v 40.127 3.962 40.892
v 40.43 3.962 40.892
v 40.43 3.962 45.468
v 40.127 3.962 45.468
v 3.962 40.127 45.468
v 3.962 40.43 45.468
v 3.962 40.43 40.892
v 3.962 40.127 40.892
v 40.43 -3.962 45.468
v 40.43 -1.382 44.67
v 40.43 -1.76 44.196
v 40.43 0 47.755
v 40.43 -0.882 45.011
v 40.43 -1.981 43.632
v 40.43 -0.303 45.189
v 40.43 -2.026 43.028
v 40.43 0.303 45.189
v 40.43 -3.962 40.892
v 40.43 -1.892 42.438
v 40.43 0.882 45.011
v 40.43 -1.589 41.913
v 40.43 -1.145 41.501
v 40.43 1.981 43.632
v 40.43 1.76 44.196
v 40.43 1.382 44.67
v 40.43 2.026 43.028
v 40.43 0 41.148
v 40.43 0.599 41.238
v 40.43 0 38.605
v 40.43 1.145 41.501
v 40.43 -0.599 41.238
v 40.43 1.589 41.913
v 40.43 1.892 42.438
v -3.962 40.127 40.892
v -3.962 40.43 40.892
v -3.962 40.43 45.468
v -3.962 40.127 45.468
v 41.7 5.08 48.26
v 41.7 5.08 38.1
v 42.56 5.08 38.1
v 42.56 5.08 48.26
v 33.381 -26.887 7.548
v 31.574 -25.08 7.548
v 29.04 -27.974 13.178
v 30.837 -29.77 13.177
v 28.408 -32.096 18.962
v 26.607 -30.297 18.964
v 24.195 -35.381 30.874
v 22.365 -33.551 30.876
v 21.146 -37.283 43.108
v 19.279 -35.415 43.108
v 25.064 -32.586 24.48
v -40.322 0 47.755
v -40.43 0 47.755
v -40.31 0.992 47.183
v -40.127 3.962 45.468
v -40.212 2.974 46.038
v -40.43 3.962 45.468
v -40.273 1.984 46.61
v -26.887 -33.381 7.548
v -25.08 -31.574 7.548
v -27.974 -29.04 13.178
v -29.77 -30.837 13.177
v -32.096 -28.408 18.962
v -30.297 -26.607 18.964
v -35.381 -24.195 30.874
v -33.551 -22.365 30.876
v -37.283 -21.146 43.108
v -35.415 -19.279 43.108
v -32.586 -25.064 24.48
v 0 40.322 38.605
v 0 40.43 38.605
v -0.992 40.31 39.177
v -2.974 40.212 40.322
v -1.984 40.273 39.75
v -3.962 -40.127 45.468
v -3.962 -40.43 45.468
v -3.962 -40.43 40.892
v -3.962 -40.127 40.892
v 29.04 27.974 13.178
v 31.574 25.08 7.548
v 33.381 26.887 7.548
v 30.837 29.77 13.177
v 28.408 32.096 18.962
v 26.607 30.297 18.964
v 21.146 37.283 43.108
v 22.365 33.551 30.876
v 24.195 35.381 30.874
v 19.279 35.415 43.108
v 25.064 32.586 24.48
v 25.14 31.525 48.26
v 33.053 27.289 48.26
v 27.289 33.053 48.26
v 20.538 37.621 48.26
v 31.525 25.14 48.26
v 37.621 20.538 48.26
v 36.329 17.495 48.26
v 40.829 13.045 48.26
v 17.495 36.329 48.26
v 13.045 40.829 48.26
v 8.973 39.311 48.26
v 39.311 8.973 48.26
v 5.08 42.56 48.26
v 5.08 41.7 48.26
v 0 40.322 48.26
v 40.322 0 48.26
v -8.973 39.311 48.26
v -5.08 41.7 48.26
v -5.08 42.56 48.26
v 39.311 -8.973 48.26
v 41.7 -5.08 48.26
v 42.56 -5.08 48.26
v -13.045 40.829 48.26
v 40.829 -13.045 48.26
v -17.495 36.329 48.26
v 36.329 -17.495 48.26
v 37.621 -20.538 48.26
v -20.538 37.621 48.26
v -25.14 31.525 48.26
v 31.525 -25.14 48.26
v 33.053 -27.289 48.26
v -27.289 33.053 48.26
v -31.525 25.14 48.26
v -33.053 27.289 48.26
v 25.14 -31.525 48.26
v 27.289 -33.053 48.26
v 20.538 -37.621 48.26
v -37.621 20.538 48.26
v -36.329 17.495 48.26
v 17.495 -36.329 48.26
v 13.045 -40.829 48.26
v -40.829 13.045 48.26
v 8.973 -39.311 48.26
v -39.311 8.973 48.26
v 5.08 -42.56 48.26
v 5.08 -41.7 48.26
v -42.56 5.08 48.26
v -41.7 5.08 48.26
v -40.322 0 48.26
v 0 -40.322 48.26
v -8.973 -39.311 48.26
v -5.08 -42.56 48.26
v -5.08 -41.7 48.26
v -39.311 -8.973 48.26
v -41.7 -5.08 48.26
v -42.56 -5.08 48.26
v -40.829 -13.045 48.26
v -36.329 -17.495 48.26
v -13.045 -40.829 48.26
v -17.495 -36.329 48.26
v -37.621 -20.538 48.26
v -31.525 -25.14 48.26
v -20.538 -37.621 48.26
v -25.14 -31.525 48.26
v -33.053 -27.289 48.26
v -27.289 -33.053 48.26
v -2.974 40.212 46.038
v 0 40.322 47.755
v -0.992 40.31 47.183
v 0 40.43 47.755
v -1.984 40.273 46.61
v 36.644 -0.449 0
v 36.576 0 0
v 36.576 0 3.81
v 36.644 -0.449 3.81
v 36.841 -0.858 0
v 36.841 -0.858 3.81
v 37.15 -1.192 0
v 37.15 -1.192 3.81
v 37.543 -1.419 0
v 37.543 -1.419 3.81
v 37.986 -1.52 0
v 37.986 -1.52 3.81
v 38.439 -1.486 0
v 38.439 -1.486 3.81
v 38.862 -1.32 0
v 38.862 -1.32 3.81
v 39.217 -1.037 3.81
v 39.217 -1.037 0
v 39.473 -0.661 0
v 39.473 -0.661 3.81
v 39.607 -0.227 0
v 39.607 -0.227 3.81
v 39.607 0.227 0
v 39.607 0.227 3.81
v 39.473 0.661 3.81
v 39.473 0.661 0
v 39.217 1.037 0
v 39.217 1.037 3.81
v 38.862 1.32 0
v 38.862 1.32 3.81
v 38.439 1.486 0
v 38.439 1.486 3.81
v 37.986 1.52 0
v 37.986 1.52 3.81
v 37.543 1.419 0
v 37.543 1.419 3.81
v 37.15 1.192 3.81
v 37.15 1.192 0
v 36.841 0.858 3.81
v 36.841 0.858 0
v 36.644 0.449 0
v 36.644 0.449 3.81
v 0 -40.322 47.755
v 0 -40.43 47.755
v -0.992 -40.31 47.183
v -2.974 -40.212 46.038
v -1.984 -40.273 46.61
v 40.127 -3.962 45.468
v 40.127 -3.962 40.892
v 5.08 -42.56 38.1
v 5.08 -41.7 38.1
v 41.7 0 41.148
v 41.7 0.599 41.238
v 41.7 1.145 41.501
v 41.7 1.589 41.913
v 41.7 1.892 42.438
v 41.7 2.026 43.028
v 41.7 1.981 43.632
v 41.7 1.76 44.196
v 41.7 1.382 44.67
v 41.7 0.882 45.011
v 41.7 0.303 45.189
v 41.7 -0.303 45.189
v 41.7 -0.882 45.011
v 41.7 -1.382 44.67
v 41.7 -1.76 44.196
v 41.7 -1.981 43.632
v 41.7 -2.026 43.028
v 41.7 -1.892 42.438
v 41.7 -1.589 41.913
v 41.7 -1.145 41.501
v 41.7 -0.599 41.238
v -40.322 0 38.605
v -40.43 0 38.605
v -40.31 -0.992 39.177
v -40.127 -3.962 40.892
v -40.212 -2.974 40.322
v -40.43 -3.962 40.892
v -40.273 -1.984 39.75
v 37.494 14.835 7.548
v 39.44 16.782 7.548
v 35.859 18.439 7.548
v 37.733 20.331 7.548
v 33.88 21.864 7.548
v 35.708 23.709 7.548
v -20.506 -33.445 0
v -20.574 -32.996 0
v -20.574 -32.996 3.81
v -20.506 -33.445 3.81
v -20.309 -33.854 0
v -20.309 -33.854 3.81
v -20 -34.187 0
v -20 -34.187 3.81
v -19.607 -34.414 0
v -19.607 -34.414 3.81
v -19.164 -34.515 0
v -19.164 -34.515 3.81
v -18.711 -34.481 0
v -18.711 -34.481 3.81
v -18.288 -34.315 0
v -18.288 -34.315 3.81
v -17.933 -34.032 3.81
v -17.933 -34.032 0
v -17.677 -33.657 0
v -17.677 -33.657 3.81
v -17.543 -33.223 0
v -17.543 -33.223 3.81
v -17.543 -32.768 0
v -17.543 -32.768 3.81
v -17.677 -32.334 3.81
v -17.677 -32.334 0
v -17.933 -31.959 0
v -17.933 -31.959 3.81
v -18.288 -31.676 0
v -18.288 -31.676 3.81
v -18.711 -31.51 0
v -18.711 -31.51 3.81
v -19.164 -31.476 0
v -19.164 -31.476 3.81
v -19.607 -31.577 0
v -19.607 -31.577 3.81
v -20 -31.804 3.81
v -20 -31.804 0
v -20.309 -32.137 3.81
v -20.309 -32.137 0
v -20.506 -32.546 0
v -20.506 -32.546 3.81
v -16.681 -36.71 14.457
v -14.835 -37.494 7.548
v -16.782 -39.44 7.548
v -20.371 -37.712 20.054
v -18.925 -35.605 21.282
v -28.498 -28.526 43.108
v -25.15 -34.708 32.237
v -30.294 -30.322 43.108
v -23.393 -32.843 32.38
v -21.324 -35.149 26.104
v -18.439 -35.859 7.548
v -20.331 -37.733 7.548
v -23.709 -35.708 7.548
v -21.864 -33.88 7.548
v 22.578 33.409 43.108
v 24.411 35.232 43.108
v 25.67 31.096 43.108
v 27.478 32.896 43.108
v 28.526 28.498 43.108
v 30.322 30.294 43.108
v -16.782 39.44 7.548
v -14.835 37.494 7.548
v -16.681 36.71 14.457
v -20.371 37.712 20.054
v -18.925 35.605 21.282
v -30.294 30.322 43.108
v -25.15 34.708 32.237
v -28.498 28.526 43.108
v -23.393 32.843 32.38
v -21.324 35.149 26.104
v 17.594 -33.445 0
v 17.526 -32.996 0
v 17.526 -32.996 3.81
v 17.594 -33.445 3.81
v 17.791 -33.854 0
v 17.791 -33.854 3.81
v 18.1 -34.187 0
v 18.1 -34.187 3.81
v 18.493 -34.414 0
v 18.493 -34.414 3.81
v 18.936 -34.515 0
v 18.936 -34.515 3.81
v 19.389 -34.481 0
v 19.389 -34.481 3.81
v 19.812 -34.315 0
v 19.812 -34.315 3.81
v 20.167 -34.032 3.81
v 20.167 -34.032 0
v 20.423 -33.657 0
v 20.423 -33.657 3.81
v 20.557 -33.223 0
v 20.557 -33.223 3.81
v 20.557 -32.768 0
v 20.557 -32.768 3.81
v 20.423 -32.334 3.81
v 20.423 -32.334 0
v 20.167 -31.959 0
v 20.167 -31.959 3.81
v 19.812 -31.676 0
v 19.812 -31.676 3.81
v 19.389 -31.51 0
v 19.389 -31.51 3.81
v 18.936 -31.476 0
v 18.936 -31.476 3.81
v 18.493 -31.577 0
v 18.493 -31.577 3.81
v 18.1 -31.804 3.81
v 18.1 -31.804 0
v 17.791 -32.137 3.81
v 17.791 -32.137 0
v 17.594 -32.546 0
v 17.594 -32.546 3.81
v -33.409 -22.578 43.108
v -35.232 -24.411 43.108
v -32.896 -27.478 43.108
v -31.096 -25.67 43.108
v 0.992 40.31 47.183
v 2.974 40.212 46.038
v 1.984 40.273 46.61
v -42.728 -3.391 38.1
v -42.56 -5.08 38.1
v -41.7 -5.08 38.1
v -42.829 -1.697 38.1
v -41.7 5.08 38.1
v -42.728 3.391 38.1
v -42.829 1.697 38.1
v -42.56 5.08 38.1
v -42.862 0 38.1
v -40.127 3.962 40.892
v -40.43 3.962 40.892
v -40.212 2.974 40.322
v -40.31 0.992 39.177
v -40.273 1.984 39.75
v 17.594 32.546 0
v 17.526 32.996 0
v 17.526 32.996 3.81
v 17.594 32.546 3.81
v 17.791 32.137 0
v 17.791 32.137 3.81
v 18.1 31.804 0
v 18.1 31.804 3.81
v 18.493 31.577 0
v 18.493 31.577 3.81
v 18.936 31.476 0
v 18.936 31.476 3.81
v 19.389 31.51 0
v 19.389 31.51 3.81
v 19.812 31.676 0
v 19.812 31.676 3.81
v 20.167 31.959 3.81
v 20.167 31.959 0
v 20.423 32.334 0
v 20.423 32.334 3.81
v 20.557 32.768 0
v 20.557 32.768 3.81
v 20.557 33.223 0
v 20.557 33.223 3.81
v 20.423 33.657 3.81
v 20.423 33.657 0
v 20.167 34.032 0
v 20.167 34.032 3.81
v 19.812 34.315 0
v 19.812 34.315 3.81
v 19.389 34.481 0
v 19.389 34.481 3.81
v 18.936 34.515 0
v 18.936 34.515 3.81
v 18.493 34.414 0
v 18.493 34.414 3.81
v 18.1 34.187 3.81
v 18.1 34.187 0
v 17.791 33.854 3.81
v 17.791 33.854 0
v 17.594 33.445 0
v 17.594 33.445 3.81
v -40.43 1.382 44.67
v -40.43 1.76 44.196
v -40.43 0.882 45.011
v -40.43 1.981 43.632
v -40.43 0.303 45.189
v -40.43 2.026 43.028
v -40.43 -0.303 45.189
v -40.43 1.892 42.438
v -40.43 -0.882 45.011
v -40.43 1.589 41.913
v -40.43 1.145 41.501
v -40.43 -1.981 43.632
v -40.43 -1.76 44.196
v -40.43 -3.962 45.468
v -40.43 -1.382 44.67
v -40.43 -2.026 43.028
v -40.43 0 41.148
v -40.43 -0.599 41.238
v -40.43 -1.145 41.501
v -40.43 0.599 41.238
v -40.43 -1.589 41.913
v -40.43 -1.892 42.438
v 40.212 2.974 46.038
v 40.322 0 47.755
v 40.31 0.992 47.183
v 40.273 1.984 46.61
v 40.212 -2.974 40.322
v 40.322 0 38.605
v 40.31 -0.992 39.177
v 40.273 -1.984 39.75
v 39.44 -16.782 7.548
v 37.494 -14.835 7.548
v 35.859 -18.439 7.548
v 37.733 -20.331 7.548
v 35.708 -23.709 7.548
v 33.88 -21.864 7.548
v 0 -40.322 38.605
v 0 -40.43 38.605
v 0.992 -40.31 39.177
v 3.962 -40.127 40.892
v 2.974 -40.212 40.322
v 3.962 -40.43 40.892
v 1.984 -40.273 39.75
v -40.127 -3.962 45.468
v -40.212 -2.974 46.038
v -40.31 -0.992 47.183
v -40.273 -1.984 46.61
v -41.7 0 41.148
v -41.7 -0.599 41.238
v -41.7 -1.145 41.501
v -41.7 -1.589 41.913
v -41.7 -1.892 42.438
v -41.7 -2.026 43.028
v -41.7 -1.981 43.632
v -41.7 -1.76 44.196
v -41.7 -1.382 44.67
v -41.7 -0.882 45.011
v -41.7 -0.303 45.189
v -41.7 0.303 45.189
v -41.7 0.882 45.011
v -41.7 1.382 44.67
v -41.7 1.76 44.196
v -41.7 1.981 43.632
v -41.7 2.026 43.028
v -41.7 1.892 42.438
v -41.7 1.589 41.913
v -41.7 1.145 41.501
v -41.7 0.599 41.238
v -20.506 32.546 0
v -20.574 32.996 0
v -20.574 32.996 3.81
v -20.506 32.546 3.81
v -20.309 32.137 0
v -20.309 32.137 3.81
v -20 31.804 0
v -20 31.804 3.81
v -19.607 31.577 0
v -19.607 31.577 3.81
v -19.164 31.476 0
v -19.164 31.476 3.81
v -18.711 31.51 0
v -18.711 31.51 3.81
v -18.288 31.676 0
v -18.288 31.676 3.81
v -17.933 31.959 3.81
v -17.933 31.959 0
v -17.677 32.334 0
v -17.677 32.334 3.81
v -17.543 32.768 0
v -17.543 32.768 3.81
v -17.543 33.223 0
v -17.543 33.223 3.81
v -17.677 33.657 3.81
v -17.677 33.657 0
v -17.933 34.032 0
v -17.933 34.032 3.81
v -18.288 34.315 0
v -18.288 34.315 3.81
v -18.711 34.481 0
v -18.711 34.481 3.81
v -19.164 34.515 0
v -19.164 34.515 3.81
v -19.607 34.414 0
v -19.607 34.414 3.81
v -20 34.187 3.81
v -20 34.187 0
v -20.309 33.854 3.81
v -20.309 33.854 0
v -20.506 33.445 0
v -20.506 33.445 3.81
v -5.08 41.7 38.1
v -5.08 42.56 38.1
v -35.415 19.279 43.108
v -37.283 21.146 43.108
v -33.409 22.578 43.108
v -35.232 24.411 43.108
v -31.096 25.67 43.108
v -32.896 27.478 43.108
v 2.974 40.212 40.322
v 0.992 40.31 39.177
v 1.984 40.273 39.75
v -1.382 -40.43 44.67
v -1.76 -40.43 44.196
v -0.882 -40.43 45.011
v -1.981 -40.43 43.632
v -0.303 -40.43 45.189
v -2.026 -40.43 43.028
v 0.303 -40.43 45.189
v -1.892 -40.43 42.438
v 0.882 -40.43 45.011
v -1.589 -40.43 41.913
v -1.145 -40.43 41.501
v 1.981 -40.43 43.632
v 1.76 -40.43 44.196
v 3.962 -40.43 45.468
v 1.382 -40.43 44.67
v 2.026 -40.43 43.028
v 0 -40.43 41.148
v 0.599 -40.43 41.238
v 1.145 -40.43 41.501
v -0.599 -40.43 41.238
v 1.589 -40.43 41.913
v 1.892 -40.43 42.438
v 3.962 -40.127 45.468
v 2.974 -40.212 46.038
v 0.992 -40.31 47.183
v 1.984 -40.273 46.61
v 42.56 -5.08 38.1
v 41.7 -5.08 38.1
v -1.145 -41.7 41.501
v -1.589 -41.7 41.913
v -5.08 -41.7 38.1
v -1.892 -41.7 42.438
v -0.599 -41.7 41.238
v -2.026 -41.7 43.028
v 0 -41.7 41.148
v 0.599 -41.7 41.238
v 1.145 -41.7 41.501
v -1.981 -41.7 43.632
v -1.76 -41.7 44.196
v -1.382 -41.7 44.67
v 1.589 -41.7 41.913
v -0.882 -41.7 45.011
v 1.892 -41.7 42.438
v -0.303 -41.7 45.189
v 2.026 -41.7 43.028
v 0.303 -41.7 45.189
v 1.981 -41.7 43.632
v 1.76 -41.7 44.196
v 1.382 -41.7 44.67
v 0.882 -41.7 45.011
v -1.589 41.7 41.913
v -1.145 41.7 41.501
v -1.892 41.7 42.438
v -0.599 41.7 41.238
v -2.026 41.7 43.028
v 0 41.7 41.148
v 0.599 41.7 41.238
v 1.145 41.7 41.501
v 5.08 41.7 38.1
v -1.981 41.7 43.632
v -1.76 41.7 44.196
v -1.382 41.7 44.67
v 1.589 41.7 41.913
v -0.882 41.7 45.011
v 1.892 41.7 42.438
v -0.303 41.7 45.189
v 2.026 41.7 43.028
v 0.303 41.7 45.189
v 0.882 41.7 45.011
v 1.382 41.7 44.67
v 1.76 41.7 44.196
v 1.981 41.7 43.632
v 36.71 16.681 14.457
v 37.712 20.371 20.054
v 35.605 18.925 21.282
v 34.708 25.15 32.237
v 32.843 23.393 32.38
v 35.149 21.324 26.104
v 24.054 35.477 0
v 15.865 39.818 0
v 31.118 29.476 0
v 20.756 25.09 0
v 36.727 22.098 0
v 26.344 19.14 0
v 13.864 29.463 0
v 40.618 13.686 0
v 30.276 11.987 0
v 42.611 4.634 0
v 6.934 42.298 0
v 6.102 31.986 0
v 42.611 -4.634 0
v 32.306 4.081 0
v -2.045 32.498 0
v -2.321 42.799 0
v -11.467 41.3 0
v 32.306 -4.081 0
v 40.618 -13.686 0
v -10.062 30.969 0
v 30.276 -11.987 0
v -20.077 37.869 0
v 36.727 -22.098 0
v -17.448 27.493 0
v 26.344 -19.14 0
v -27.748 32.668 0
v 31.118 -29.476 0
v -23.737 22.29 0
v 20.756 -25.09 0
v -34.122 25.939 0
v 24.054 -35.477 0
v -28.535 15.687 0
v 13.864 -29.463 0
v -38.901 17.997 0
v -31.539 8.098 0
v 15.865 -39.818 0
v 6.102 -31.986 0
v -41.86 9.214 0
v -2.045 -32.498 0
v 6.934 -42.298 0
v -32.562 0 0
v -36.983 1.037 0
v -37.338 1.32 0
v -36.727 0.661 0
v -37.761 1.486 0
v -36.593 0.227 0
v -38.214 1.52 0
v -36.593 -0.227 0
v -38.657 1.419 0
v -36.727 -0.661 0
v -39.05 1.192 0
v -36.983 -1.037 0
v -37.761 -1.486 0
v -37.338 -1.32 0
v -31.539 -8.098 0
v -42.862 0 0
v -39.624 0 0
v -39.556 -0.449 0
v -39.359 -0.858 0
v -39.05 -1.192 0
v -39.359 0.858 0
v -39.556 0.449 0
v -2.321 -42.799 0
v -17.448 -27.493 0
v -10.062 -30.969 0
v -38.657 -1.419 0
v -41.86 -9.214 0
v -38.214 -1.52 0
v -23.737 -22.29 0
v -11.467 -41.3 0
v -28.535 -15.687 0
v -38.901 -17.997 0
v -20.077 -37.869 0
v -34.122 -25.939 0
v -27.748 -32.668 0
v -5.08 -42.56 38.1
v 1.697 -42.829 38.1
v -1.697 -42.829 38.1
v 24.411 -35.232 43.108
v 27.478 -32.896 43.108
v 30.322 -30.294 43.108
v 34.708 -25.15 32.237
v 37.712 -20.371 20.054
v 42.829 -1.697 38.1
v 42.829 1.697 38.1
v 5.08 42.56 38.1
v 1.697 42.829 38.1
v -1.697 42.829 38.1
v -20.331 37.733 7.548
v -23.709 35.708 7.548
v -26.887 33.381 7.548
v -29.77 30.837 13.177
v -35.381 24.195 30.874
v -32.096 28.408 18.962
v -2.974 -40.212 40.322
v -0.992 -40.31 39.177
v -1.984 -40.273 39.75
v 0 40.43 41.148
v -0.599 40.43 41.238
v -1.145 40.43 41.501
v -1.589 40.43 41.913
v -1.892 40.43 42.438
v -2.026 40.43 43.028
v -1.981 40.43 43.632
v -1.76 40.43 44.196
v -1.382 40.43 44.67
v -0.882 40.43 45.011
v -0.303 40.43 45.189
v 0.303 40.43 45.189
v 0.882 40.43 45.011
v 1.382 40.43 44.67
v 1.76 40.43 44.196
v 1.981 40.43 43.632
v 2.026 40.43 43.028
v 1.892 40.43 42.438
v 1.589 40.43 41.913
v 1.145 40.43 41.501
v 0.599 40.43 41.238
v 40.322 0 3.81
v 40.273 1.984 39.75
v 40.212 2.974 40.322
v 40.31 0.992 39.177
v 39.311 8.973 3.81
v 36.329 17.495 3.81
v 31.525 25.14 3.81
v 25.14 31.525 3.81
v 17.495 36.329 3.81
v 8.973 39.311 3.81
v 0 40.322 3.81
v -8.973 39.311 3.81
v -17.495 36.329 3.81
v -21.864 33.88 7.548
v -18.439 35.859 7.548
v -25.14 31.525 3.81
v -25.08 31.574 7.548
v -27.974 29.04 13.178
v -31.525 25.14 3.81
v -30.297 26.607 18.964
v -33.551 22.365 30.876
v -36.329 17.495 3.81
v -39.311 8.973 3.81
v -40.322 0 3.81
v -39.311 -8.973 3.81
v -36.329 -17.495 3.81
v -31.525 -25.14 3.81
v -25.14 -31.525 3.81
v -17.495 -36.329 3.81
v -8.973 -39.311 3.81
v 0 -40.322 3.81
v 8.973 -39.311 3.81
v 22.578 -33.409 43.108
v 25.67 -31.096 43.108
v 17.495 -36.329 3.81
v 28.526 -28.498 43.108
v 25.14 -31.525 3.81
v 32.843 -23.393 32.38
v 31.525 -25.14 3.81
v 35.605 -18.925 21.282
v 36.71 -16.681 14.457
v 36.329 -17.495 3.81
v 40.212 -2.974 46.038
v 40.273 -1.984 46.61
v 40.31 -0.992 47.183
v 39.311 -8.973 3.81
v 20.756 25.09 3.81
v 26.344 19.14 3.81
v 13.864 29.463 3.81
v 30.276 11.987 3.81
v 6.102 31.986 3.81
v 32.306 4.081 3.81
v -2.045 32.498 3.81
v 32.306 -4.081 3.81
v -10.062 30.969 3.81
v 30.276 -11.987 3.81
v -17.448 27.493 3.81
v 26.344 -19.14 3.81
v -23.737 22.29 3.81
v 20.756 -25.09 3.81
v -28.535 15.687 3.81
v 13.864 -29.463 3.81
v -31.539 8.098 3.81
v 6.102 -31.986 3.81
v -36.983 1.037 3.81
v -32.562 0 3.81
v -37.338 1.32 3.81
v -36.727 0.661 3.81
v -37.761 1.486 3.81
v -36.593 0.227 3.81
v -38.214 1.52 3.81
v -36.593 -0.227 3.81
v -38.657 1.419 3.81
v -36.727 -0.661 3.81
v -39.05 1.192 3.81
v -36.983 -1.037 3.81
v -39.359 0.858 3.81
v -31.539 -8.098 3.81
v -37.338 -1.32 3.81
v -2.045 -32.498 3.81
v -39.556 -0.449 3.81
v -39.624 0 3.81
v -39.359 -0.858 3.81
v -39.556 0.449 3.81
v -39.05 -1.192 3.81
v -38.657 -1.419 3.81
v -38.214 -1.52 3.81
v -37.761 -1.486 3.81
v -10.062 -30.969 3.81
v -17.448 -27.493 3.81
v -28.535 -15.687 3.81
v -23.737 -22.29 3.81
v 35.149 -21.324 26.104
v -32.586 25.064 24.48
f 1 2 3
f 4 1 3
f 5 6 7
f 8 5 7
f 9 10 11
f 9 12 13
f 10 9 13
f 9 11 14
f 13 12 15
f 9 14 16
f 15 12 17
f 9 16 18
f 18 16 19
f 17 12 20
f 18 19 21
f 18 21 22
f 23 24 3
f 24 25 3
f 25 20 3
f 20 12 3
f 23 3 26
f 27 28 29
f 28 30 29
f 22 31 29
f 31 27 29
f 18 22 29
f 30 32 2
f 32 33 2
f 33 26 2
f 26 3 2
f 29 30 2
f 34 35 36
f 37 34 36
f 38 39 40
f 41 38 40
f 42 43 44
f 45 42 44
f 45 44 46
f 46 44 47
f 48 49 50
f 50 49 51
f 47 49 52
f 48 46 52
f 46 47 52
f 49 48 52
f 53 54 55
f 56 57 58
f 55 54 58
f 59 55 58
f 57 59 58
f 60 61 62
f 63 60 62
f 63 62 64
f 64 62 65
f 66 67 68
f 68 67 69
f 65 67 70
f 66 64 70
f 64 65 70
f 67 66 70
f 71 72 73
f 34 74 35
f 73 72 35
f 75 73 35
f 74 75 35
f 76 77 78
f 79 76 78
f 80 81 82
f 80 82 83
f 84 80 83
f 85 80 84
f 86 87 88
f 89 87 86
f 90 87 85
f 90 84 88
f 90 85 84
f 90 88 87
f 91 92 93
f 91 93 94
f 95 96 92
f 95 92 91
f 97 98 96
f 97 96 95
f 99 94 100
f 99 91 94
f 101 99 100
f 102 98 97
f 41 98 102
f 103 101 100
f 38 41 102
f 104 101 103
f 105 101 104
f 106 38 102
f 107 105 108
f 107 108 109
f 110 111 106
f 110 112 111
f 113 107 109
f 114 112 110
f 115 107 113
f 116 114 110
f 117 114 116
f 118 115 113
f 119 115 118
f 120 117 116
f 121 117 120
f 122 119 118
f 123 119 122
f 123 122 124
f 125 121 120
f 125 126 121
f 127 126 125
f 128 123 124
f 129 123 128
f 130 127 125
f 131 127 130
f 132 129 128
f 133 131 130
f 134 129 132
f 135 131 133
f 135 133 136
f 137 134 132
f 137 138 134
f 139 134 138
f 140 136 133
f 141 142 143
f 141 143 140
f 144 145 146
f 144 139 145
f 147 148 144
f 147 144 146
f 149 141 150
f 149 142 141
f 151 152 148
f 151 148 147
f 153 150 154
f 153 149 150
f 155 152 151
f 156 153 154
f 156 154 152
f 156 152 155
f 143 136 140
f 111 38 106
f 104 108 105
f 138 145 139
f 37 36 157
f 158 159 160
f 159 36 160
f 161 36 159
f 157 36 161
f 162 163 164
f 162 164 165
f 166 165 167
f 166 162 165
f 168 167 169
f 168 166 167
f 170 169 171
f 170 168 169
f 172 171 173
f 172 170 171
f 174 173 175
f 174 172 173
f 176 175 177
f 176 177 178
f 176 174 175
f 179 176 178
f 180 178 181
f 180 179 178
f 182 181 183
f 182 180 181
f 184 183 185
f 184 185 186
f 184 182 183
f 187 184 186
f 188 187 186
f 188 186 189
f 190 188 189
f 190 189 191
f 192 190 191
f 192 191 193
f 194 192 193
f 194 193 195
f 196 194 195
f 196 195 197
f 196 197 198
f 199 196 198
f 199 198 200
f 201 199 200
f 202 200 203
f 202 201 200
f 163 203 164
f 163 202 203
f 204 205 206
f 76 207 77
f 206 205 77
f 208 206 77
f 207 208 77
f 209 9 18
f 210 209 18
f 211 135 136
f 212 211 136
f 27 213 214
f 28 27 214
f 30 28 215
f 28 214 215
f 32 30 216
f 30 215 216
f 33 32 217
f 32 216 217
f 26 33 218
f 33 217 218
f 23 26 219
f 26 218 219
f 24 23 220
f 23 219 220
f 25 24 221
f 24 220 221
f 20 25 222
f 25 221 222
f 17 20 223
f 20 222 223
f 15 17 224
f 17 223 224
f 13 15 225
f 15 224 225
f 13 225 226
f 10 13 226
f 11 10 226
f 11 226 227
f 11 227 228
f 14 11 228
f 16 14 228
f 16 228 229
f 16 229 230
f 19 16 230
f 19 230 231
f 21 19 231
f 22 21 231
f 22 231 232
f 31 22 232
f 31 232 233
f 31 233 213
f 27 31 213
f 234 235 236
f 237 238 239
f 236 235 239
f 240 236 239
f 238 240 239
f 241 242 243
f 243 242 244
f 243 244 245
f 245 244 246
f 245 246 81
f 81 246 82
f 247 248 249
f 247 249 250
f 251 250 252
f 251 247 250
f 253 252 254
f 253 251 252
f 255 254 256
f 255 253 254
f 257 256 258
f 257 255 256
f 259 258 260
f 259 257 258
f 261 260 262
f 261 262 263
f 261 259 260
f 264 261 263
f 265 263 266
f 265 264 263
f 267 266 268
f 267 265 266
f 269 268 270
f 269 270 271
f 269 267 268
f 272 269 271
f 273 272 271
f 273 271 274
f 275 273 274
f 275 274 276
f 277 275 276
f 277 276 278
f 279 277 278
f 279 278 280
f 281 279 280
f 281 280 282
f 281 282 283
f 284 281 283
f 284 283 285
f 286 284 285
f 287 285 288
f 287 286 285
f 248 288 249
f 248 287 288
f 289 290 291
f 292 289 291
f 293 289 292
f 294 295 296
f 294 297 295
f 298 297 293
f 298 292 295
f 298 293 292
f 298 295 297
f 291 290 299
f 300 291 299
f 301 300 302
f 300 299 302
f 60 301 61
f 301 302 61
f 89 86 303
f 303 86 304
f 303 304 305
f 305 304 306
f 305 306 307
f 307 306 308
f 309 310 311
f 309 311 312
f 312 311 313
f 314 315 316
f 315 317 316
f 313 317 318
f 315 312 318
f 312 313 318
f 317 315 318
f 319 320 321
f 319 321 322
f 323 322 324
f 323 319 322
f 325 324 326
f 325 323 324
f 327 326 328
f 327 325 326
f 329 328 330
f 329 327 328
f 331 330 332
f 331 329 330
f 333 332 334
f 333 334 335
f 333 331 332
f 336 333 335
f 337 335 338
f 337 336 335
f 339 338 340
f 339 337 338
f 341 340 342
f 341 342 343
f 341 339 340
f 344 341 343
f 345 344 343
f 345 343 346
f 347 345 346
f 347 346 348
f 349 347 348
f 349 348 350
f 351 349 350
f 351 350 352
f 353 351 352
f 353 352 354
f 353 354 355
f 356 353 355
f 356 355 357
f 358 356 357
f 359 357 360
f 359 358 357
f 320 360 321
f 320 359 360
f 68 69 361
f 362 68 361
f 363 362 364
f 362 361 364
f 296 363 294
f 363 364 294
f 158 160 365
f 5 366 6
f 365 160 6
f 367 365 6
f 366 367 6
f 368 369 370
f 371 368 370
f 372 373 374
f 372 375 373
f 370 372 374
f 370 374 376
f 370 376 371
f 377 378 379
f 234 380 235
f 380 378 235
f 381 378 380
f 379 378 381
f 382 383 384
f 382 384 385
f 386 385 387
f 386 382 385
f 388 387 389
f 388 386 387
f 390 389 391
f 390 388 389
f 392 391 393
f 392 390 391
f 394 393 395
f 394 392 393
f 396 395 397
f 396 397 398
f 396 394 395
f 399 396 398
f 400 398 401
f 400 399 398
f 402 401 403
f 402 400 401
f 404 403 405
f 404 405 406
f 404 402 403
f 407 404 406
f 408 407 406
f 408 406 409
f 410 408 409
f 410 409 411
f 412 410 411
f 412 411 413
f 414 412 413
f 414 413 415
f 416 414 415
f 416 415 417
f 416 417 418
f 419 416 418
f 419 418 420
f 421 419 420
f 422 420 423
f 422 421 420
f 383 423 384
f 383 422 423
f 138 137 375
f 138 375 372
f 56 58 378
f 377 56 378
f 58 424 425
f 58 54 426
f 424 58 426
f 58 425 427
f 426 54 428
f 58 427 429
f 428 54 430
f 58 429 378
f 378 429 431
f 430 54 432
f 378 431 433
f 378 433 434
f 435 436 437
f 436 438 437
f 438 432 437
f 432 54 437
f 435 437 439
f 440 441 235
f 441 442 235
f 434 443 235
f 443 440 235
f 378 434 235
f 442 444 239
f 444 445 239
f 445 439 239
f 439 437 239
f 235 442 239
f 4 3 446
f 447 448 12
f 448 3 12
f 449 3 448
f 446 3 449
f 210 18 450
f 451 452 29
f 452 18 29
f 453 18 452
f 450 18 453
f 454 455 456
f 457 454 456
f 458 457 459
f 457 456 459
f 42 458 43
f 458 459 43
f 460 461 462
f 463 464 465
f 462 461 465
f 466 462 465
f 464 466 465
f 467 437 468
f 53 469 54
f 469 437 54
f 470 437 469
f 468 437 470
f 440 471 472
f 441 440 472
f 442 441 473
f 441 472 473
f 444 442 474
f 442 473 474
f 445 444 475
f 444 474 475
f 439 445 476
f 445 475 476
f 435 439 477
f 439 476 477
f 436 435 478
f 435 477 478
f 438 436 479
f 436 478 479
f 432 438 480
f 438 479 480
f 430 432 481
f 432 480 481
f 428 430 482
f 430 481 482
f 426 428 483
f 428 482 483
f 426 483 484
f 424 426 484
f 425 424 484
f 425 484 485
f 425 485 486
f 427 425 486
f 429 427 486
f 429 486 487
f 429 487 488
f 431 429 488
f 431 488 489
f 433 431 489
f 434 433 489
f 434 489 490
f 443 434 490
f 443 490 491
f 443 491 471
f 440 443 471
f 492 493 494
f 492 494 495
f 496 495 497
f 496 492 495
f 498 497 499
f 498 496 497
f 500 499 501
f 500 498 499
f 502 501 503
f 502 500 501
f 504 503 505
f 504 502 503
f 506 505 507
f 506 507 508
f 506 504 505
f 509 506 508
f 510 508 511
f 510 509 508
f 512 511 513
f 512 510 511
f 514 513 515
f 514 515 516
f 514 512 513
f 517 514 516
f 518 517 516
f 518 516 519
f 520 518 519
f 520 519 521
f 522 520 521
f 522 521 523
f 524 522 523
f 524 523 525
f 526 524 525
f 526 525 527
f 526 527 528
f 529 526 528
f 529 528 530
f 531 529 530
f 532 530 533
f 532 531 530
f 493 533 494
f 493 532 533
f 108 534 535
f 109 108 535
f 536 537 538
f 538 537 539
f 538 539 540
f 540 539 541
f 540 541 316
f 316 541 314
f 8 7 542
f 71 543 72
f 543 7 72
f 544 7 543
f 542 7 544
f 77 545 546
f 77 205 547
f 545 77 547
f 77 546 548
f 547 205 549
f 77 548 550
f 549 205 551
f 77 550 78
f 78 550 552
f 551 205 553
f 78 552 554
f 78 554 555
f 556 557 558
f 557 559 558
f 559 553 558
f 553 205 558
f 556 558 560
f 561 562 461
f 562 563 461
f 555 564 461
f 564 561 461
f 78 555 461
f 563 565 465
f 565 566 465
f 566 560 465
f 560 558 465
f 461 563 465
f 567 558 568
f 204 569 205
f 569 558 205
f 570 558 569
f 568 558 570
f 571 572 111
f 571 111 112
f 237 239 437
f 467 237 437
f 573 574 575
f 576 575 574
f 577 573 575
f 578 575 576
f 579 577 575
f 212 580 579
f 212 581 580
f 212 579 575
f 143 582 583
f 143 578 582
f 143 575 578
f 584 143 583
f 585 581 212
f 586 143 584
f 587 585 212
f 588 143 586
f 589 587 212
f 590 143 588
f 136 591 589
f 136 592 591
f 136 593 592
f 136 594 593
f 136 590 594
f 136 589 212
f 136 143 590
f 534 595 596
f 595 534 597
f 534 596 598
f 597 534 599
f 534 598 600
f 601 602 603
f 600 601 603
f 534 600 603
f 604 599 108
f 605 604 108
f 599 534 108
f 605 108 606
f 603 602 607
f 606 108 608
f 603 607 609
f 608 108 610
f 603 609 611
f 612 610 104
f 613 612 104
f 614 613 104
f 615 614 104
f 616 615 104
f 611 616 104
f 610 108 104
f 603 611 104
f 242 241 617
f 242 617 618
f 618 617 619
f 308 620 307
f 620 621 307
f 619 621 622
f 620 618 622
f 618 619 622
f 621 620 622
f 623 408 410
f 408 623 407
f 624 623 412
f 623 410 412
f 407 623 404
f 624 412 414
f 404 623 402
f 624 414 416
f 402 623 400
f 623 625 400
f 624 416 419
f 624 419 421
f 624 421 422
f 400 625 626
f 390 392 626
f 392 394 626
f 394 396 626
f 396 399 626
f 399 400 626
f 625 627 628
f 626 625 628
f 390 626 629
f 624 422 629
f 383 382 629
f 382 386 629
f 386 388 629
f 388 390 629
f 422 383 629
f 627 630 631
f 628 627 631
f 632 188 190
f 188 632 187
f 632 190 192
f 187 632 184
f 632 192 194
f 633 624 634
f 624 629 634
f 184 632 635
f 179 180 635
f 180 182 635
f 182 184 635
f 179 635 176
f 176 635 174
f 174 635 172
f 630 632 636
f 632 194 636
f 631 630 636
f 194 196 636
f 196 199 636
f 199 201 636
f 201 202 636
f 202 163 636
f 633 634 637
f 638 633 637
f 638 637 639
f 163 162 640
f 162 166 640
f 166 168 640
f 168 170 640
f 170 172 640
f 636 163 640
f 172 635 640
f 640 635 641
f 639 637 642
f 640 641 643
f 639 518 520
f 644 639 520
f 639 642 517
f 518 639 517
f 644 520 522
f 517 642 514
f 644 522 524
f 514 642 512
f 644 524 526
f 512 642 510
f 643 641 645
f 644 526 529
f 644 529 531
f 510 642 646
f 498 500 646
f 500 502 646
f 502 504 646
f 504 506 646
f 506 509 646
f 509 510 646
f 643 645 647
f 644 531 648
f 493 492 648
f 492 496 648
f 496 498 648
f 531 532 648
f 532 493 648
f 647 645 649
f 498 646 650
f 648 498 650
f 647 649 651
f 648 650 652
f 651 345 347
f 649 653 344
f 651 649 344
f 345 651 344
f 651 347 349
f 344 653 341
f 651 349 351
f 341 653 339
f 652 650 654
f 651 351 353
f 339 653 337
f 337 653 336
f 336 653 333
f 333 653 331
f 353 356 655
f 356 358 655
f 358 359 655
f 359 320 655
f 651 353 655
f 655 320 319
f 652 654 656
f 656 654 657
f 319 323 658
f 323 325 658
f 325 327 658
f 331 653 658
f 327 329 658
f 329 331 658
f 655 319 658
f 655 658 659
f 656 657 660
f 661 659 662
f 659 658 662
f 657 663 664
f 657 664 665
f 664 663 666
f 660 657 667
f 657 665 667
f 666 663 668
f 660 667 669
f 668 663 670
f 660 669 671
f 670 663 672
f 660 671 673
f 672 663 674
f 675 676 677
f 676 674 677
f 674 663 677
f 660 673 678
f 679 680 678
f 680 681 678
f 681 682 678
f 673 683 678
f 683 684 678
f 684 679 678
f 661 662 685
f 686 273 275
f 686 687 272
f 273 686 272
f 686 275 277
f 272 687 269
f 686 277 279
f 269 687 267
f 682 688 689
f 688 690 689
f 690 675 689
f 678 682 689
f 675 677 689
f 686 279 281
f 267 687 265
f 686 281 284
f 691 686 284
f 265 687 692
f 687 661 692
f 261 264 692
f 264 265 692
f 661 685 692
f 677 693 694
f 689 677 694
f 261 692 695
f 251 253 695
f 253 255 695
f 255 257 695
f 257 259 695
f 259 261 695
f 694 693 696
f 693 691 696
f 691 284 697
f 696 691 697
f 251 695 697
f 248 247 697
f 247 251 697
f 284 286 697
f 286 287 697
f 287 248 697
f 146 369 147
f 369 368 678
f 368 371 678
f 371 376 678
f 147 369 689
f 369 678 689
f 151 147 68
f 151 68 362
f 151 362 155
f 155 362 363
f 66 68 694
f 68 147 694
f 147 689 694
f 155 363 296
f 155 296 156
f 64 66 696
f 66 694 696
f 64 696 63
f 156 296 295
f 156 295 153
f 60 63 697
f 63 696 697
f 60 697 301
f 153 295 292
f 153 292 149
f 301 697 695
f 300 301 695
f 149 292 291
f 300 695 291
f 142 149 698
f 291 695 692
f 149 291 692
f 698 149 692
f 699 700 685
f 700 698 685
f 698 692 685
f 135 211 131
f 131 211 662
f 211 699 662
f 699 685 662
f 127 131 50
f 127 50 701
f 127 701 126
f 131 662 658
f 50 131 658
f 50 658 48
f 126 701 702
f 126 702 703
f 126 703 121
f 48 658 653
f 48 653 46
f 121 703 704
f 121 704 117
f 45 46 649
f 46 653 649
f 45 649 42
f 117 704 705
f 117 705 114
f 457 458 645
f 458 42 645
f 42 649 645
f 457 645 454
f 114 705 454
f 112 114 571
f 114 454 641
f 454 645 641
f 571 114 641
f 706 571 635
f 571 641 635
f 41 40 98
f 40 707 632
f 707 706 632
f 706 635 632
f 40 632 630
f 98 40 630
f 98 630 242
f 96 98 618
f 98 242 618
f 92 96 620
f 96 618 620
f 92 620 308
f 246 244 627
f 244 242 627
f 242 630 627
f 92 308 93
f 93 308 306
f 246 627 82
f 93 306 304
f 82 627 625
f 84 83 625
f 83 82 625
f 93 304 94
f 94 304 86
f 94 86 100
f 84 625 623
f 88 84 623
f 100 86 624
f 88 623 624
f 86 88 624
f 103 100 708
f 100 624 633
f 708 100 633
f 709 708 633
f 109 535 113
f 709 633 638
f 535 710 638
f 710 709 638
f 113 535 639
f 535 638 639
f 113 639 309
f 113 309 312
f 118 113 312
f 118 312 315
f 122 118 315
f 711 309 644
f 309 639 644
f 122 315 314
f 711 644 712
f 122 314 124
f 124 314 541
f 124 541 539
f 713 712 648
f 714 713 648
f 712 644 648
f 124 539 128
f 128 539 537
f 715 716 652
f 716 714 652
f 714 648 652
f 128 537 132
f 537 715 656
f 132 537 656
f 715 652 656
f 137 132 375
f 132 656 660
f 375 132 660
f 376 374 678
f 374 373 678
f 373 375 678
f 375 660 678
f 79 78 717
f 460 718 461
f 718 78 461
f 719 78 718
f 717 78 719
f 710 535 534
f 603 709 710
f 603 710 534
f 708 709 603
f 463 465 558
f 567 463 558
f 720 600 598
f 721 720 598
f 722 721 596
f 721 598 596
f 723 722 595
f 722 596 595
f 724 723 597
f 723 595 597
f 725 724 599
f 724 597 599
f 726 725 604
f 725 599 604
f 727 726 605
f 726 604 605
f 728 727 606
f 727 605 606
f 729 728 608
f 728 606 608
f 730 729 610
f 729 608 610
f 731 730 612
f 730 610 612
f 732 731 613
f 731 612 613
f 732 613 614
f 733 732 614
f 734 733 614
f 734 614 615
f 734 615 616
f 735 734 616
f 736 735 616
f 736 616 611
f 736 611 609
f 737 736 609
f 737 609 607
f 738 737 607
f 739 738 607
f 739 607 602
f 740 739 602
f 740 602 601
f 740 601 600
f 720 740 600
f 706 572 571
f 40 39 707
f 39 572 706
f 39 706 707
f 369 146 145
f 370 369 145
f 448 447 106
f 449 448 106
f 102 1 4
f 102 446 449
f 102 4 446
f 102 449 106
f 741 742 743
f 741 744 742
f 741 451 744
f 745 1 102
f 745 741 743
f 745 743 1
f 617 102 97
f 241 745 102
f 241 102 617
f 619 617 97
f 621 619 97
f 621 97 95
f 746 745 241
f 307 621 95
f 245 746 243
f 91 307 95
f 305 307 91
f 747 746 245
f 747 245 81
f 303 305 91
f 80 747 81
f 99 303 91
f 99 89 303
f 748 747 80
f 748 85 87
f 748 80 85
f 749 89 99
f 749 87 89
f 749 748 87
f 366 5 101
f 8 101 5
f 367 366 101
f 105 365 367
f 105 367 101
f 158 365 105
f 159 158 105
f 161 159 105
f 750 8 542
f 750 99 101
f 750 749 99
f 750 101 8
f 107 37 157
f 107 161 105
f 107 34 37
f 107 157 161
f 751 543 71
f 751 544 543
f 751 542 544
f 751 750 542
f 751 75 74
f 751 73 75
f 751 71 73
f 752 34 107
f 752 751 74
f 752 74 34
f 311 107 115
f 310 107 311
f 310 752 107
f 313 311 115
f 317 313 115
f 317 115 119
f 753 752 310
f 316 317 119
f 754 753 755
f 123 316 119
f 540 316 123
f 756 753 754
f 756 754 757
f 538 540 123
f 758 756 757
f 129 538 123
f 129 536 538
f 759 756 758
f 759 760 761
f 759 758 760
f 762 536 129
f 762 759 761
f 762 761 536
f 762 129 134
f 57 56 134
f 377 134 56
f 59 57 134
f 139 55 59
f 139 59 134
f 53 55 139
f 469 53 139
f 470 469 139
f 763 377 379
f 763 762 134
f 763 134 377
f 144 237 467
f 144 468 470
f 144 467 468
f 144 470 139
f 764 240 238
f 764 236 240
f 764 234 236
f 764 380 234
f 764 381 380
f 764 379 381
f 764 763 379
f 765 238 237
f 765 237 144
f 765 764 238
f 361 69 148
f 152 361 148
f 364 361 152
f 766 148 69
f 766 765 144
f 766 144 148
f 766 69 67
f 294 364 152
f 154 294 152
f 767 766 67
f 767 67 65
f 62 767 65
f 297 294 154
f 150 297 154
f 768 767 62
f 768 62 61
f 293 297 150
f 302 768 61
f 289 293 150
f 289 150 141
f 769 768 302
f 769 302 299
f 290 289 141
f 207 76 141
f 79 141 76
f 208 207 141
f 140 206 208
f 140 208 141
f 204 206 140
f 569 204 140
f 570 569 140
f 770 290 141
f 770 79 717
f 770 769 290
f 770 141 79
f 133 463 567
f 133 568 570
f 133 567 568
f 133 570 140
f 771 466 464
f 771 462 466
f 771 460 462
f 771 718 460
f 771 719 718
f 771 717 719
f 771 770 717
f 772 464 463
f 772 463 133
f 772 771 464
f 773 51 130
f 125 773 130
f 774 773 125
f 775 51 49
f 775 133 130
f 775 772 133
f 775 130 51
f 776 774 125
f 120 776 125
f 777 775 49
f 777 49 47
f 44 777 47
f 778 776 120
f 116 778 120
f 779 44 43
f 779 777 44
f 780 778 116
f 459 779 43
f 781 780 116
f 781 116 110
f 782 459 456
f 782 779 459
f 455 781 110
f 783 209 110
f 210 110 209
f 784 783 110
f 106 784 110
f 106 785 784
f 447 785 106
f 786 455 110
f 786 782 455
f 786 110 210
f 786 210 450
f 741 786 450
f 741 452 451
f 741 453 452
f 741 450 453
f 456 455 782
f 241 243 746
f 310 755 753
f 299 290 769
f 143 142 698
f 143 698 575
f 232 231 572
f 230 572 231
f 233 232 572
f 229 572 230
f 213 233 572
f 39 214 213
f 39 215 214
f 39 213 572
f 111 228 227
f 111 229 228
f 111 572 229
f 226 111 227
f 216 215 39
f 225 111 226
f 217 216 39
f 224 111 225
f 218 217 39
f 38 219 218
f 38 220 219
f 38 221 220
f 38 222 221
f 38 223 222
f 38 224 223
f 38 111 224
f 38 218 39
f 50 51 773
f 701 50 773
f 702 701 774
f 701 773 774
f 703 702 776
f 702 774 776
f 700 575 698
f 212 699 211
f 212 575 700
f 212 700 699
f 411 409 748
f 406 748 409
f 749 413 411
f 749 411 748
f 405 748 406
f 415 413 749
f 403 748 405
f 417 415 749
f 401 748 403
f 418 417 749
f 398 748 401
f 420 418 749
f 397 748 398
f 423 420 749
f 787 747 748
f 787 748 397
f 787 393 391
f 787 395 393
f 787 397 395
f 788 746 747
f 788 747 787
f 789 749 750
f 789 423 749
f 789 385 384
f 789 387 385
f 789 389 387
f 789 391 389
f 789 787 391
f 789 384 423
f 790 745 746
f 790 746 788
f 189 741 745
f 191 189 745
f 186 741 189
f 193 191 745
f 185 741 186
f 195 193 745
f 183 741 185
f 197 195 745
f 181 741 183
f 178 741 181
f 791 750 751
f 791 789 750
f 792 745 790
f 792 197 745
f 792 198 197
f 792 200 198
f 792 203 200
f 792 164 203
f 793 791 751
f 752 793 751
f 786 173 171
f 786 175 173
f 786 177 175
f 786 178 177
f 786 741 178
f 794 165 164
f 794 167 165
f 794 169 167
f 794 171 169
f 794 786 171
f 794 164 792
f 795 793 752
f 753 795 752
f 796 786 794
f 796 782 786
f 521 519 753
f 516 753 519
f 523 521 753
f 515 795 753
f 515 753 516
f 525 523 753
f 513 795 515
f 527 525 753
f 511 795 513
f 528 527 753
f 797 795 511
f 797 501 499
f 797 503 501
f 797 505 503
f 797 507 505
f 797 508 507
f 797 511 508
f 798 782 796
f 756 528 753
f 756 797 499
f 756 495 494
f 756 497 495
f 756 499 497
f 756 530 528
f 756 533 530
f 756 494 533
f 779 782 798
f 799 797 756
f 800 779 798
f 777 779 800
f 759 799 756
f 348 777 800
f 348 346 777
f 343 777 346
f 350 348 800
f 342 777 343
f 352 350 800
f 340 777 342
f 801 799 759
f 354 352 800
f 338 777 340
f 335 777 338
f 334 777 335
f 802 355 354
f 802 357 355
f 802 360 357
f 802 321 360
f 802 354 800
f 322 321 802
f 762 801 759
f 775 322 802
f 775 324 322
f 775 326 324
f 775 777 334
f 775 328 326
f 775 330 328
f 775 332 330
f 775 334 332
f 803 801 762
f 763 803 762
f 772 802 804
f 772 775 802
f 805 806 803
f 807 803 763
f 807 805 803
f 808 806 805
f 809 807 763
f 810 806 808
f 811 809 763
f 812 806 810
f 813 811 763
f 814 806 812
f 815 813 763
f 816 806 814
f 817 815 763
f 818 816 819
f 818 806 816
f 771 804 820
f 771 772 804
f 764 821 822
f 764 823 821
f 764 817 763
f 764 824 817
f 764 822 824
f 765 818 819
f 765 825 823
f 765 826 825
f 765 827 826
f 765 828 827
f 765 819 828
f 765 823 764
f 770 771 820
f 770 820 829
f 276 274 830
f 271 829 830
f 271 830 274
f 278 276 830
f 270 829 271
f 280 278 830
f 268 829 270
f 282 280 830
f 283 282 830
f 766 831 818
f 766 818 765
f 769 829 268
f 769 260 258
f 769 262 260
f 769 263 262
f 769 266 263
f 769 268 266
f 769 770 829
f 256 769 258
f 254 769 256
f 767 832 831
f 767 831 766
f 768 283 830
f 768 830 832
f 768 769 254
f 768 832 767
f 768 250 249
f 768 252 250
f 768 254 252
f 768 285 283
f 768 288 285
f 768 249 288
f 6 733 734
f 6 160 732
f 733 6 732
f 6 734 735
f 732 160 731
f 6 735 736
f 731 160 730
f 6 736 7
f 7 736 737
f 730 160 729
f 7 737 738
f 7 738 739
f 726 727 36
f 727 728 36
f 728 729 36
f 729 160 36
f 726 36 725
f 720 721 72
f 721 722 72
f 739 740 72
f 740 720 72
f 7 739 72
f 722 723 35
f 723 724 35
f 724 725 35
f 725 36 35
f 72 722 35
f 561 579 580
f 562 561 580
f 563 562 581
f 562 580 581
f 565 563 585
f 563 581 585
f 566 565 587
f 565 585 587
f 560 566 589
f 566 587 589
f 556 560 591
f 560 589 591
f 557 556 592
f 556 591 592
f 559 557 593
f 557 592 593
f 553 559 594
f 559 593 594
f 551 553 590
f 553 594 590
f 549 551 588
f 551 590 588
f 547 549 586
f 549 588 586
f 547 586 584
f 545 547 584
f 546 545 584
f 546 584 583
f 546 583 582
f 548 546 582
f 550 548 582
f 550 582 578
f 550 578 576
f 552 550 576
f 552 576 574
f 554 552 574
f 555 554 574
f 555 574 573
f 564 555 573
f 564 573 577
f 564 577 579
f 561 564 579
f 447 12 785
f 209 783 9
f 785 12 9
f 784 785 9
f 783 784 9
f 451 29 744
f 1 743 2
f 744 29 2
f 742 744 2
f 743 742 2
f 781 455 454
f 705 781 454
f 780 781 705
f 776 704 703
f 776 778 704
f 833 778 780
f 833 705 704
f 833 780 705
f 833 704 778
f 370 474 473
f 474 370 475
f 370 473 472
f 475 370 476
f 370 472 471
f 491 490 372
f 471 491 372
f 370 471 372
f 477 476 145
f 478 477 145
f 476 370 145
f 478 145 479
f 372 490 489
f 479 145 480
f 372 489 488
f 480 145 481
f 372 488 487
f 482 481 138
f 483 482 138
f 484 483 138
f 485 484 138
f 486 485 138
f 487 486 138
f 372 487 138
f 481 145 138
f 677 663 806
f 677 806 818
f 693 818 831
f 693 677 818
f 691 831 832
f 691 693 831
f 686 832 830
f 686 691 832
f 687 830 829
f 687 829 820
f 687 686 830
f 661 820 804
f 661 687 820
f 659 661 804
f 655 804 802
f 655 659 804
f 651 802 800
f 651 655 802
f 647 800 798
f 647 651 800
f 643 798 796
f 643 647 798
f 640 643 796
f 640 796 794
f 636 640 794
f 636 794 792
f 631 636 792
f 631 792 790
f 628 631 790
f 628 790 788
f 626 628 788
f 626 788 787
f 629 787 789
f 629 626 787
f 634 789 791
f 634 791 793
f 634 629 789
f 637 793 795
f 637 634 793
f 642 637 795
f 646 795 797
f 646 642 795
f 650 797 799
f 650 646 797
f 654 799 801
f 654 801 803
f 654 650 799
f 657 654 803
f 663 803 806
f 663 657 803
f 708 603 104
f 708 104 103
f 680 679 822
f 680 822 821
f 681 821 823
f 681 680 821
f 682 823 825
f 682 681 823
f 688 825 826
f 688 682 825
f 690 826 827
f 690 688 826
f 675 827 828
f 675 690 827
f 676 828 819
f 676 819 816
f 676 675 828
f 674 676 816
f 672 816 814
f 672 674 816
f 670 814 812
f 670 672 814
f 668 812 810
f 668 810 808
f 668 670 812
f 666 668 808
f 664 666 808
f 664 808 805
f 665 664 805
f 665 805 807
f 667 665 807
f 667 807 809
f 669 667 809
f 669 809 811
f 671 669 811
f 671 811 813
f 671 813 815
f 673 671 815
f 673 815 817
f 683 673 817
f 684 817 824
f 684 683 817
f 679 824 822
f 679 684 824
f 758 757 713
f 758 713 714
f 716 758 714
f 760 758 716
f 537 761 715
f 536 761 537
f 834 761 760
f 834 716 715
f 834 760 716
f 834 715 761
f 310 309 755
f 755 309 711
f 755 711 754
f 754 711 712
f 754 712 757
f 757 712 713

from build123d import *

# Parameters (mm, degrees)
SKETCH2_R           = 42.8622
SKETCH2_R_2         = 32.562372804
SKETCH2_R_3         = 1.524
BOSS_EXTRUDE1_DEPTH = 3.81
SKETCH3_R           = 42.8622
SKETCH3_R_2         = 40.3222
BOSS_EXTRUDE2_DEPTH = 44.45
SKETCH7_W           = 2.674266908
SKETCH7_H           = 10.16
SKETCH7_W_2         = 10.16
SKETCH7_H_2         = 2.674266908
CUT_EXTRUDE2_DEPTH  = 10.16
CUT_EXTRUDE3_DEPTH  = 10.16
SKETCH9_R           = 2.032
CUT_EXTRUDE4_DEPTH  = 10.16
CIRPATTERN2_COUNT   = 4
CUT_EXTRUDE5_DEPTH  = 78.481378264
CIRPATTERN3_COUNT   = 2
CIRPATTERN3_ANGLE   = 90


with BuildPart() as part:
    # Sketch2 → Boss-Extrude1 (new body)
    with BuildSketch(Plane.XY):
        Circle(SKETCH2_R)
        Circle(SKETCH2_R_2, mode=Mode.SUBTRACT)
        with Locations((-19.05, 32.995567884)):
            Circle(SKETCH2_R_3, mode=Mode.SUBTRACT)
        with Locations((-38.1, 0)):
            Circle(SKETCH2_R_3, mode=Mode.SUBTRACT)
        with Locations((-19.05, -32.995567884)):
            Circle(SKETCH2_R_3, mode=Mode.SUBTRACT)
        with Locations((19.05, -32.995567884)):
            Circle(SKETCH2_R_3, mode=Mode.SUBTRACT)
        with Locations((38.1, 0)):
            Circle(SKETCH2_R_3, mode=Mode.SUBTRACT)
        with Locations((19.05, 32.995567884)):
            Circle(SKETCH2_R_3, mode=Mode.SUBTRACT)
    extrude(amount=BOSS_EXTRUDE1_DEPTH)

    # Sketch3 → Boss-Extrude2 (add)
    with BuildSketch(Plane.XY.offset(3.81)):
        Circle(SKETCH3_R)
        Circle(SKETCH3_R_2, mode=Mode.SUBTRACT)
    extrude(amount=BOSS_EXTRUDE2_DEPTH)

    # Sketch7 → Cut-Extrude2 (cut)
    with BuildSketch(Plane.XY.offset(48.26)):
        with Locations((43.037064748, 0)):
            Rectangle(SKETCH7_W, SKETCH7_H)
        with Locations((0, -43.037064748)):
            Rectangle(SKETCH7_W_2, SKETCH7_H_2)
        with Locations((-43.037064748, 0)):
            Rectangle(SKETCH7_W, SKETCH7_H)
        with Locations((0, 43.037064748)):
            Rectangle(SKETCH7_W_2, SKETCH7_H_2)
    extrude(amount=-CUT_EXTRUDE2_DEPTH, mode=Mode.SUBTRACT)

    # Sketch8 → Cut-Extrude3 (cut)
    with BuildSketch(Plane(origin=(40.429931294, 0, 0), x_dir=(0, 0, -1), z_dir=(1, 0, 0))):
        Polygon((-38.604614587, 0), (-40.892307293, 3.9624), (-45.467692707, 3.9624), (-47.755385413, 0), (-45.467692707, -3.9624), (-40.892307293, -3.9624), align=None)
    cut_extrude3 = extrude(amount=-CUT_EXTRUDE3_DEPTH, mode=Mode.SUBTRACT)

    # Sketch9 → Cut-Extrude4 (cut)
    with BuildSketch(Plane(origin=(41.699931294, 0, 0), x_dir=(0, 0, -1), z_dir=(1, 0, 0))):
        with Locations((-43.18, 0)):
            Circle(SKETCH9_R)
    cut_extrude4 = extrude(amount=-CUT_EXTRUDE4_DEPTH, mode=Mode.SUBTRACT)

    # CirPattern2: Cut-Extrude3, Cut-Extrude4 ×4 about axis
    cirpattern2_axis = Axis((0, 0, 48.26), (0, 0, 1))
    add([cut_extrude3.rotate(cirpattern2_axis, i * 360 / CIRPATTERN2_COUNT) for i in range(1, CIRPATTERN2_COUNT)], mode=Mode.SUBTRACT)
    add([cut_extrude4.rotate(cirpattern2_axis, i * 360 / CIRPATTERN2_COUNT) for i in range(1, CIRPATTERN2_COUNT)], mode=Mode.SUBTRACT)

    # Sketch10 → Cut-Extrude5 (cut, symmetric)
    with BuildSketch(Plane(origin=(0, 0, 0), x_dir=(0, 0, 1), z_dir=(0.7071067811865464, 0.7071067811865488, 0))):
        with BuildLine():
            Line((7.547865198, 16.021870477), (7.547865198, 4.591870477))
            add(Edge.make_bspline(
                [(7.547865198, 4.591870477), (23.63247535, -7.228573119), (43.107865198, -11.410129523)],
                knots=[0, 0, 0, 1, 1, 1], degree=2))
            Line((43.107865198, -11.410129523), (43.107865198, 0.019870477))
            add(Edge.make_bspline(
                [(7.547865198, 16.021870477), (26.879831208, 11.531662429), (43.107865198, 0.019870477)],
                knots=[0, 0, 0, 1, 1, 1], degree=2))
        make_face()
    cut_extrude5 = extrude(amount=CUT_EXTRUDE5_DEPTH, both=True, mode=Mode.SUBTRACT)

    # CirPattern3: Cut-Extrude5 ×2 about axis
    cirpattern3_axis = Axis((0, 0, 48.26), (0, 0, 1))
    for i in range(1, CIRPATTERN3_COUNT):
        add(cut_extrude5.rotate(cirpattern3_axis, i * CIRPATTERN3_ANGLE / (CIRPATTERN3_COUNT - 1)), mode=Mode.SUBTRACT)


solid = part.part
